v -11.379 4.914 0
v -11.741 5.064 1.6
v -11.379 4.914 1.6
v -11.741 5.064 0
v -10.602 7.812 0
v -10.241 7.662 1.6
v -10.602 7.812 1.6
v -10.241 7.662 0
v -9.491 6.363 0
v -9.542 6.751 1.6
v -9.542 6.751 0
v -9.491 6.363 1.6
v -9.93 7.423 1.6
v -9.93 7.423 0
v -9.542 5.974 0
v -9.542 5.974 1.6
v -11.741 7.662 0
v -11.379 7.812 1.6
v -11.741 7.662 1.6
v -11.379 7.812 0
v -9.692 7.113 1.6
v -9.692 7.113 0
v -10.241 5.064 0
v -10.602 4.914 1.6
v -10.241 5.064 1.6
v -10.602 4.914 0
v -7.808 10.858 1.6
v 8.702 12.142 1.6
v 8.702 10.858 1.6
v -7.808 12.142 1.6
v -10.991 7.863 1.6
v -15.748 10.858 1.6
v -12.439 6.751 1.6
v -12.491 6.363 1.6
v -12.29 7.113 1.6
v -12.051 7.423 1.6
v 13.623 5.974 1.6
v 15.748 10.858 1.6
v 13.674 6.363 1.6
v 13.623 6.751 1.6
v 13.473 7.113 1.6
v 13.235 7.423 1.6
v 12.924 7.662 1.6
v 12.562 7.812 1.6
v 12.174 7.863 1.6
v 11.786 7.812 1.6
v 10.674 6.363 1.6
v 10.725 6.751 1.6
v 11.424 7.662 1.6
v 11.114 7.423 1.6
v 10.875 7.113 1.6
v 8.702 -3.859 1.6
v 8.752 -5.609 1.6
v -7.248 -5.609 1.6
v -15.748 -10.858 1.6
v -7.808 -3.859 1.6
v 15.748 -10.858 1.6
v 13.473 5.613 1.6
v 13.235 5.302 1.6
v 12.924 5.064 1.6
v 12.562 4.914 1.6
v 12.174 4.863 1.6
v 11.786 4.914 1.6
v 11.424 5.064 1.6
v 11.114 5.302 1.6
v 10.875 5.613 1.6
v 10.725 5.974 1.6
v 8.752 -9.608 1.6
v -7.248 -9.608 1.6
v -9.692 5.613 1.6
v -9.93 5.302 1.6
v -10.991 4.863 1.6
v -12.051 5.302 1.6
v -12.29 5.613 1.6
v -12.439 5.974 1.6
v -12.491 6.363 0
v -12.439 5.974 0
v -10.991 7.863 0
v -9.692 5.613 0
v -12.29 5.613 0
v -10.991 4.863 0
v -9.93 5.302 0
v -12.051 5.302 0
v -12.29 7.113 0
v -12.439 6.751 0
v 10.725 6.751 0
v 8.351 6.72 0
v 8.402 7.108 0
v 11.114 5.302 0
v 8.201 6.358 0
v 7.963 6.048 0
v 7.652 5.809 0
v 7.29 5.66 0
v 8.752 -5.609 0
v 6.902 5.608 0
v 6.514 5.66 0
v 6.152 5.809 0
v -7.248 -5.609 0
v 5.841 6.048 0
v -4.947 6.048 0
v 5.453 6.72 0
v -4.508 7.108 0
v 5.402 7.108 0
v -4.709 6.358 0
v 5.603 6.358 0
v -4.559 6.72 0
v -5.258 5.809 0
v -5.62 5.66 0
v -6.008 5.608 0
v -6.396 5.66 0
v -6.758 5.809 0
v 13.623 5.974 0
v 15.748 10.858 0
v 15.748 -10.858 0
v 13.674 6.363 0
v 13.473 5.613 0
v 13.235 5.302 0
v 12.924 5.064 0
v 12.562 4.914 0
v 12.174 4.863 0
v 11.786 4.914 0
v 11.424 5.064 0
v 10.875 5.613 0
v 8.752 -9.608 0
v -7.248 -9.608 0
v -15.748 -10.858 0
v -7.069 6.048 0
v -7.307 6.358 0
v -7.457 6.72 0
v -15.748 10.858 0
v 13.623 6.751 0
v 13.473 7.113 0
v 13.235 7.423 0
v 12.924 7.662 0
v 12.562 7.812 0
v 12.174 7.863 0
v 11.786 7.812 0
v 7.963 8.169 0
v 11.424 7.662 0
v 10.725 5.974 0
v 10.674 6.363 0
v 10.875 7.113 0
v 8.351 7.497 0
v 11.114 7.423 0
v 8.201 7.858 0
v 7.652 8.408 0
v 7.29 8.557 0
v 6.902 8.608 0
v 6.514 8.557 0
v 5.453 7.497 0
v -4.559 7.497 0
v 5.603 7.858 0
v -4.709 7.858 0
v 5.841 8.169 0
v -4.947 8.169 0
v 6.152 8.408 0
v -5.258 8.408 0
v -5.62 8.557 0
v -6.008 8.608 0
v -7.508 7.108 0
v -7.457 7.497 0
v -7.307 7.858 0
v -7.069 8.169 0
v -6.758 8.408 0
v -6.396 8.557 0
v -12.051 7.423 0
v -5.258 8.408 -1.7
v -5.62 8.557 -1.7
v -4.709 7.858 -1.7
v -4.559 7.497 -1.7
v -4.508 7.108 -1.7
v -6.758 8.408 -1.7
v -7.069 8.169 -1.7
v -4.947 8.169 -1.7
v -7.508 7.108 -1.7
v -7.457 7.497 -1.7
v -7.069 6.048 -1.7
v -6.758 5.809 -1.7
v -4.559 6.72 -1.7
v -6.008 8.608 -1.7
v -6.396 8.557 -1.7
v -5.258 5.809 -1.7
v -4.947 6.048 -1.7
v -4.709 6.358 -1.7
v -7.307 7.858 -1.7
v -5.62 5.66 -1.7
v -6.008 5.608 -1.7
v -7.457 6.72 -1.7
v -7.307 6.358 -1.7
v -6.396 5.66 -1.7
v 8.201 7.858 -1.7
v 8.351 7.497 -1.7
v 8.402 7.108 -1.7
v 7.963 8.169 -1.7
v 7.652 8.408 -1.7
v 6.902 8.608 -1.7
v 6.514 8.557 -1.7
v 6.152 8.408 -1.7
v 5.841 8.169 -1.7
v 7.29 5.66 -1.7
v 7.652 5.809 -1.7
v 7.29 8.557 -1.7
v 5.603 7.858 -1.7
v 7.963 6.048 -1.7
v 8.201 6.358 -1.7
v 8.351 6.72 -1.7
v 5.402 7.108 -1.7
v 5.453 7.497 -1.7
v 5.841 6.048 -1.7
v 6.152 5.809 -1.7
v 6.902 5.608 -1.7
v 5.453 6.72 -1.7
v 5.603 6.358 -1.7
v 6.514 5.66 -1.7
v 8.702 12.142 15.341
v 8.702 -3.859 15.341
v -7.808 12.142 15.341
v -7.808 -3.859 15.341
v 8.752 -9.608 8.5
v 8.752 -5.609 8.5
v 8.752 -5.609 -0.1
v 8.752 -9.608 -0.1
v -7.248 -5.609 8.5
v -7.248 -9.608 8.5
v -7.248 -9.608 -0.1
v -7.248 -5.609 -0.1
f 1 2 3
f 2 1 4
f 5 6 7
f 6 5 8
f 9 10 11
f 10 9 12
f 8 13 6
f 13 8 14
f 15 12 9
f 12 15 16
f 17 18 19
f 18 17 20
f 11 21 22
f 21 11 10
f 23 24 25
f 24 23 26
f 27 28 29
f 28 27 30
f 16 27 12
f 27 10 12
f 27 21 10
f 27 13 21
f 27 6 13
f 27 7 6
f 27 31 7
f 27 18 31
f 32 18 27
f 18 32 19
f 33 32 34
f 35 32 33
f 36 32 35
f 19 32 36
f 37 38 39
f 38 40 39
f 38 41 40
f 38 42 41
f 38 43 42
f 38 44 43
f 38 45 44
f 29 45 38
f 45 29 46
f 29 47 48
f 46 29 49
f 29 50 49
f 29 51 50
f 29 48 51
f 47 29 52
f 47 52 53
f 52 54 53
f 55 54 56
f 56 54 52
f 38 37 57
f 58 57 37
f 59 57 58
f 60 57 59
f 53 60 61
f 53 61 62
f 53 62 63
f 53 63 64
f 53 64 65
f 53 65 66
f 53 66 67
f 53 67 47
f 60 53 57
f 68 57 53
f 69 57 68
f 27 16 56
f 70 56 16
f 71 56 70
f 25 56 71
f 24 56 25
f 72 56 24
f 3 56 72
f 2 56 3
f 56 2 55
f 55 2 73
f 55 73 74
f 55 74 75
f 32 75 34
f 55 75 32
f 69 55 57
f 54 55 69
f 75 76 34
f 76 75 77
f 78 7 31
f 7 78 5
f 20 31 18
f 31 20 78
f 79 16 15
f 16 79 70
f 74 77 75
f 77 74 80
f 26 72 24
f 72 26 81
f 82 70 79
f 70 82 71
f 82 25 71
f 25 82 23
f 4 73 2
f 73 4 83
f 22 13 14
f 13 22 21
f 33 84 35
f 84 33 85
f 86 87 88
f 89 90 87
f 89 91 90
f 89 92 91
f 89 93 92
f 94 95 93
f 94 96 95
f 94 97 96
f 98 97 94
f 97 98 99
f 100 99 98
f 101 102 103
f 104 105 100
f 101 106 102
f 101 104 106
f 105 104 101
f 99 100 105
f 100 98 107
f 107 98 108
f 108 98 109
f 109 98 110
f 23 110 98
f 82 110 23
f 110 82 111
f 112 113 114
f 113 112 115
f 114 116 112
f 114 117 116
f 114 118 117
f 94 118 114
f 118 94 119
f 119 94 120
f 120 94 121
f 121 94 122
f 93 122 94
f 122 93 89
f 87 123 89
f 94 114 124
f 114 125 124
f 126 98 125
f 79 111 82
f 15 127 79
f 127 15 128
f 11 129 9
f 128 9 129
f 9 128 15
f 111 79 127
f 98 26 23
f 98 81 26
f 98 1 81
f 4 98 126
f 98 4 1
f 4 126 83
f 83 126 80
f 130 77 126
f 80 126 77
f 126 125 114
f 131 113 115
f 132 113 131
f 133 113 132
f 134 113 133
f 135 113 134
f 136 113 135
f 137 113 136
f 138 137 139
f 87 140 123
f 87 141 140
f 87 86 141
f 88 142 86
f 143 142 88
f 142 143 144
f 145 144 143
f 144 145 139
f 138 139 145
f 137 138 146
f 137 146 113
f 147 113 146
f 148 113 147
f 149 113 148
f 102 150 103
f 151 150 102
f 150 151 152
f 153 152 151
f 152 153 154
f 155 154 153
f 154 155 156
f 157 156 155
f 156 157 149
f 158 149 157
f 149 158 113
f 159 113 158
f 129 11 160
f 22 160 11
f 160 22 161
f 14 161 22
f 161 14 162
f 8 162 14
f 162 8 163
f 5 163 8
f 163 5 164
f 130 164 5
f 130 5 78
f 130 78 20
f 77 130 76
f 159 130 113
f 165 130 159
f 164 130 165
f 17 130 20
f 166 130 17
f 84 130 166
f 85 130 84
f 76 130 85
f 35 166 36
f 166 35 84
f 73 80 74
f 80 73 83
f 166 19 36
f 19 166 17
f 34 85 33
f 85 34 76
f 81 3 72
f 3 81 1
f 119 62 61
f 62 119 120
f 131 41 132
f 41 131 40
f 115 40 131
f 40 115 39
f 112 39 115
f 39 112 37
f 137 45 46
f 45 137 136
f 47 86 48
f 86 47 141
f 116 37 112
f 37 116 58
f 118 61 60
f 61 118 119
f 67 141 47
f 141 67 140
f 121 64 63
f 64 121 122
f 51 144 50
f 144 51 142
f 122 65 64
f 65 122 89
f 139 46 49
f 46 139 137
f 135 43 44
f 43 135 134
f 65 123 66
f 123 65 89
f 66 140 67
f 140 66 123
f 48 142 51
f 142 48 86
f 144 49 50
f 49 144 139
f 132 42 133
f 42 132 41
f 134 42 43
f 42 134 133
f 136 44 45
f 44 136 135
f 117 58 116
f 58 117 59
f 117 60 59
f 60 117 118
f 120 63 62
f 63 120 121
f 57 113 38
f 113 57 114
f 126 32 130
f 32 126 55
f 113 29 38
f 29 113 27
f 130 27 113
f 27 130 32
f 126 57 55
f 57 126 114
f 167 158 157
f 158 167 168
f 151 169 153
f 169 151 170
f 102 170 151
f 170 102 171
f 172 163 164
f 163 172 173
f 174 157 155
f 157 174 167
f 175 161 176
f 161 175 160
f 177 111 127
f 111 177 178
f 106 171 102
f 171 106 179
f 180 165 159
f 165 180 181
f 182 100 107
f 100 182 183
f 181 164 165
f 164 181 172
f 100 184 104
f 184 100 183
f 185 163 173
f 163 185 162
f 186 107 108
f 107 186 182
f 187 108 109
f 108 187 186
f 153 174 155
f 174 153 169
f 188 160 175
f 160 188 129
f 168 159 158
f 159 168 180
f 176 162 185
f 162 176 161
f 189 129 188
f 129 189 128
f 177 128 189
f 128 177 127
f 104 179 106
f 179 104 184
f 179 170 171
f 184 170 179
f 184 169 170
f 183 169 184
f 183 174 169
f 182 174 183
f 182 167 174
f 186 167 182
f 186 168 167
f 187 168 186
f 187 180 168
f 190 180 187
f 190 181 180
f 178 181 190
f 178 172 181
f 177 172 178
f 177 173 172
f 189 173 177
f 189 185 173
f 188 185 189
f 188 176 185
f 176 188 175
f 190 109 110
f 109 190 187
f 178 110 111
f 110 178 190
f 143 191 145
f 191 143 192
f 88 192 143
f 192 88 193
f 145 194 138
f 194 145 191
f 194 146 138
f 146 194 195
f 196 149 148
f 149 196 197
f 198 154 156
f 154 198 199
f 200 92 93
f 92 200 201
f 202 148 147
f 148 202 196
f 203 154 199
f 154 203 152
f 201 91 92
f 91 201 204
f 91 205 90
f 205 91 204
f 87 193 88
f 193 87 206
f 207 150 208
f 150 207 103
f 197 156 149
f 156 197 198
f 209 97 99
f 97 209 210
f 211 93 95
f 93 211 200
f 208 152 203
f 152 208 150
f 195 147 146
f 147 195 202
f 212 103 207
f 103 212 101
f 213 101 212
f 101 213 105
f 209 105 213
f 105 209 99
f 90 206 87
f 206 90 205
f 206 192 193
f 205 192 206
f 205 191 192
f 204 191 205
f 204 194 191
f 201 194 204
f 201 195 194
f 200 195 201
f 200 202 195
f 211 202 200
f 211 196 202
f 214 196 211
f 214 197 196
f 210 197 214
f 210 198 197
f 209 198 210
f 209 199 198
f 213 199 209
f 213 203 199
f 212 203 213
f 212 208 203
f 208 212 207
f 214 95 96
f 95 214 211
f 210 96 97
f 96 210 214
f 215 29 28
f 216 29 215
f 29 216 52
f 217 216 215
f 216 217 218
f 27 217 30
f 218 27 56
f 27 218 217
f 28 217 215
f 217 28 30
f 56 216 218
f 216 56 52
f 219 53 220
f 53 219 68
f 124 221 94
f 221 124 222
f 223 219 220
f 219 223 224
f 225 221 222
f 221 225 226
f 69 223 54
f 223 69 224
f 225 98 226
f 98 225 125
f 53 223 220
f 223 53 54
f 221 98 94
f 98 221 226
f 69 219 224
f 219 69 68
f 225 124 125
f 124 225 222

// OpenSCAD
// file: smidge.scad
//
// Copyright (c) Stewart H. Whitman, 2020-2021.
//
// File:    smidge.scad
// Project: General
// License: CC BY-NC-SA 4.0 (Attribution-NonCommercial-ShareAlike)
// Desc:    SMIDGE constant used in preview mode.
//

// Smidge constant for rendering only (to avoid Z-axis fighting, etc.)
SMIDGE = $preview ? 0.01 : 0;
// main file
//
// Copyright (c) Stewart H. Whitman, 2020-2021.
//
// File:    commell-nic.scad
// Project: Dell Wyse 5070 2nd Ethernet Adapter Adapter
// License: CC BY-NC-SA 4.0 (Attribution-NonCommercial-ShareAlike)
// Desc:    Mock-up of the common Commell M2-210 M.2 Ethernet Daughter Board
//

include <smidge.scad>;

// Commell M2-210 M.2 A/E-type Ethernet:
// Ref: http://www.commell.com.tw/Product/Peripheral/M.2%20(NGFF)%20card/M2-210.htm
//
// Most values come from manual (direct or calculated). Missing
// values (e.g. width of board after splitting at perforation), were
// measured and are noted as such.
//
// A few measurements were corrected for better fit (or perhaps
// documentation errors) and are noted.
//

function inches_to_mm(n) = 25.4*n;

// kind:
//
// Unique, for customization.
//
function nic_kind() = "commell";

// PCB size [width,depth,thickness]
//
// Measured thickness is ~1.57mm (nominal 4-layer PCB thickness). This board
// seems a little thicker. Width is measured to perforation.
//
// The manual says 0.8331 inches depth, but it measures around 0.855, so I
// have changed that.
//
function nic_get_pcb_size() = [ inches_to_mm(1.24), inches_to_mm(0.855), 1.60 ];

// bottom hole positions [from left=0, rear=0]
function _nic_get_left_hole() = [ inches_to_mm(0.1873), nic_get_pcb_size().y - inches_to_mm(0.1770)];
function _nic_get_right_hole() = [ inches_to_mm(1.0993), nic_get_pcb_size().y - inches_to_mm(0.1770)];
function nic_get_bottom_holes() = [ _nic_get_left_hole(), _nic_get_right_hole() ];
// bottom hole diameter (M3x0.5)
function nic_get_bottom_hole_diameter() = 3.0;

// ethernet size [left<->right,front<->rear,top<->bottom]
//
// N.B.: Manual says the ethernet port measures: 0.5185" (13.2mm) x 0.6614" (16.8mm), but
//       mine measured at 0.541" (13.8mm) x 0.650" (16.5mm).
//
// Depth as measured.
//
function nic_get_ethernet_size() = [ inches_to_mm(0.650), 16.00, inches_to_mm(0.541) ];

// bracket hole sizes specified: 17.5mm W x 13.9mm V
// ethernet size in mm: 16.5mm x 13.8mm
//  implies spacing of ~0.35 around sides of the port cut out
//

// ethernet position measures 8.25mm from left side
function _nic_get_ethernet_left_pos() = inches_to_mm(0.3126) ;
function _nic_get_ethernet_right_pos() = _nic_get_ethernet_left_pos()+nic_get_ethernet_size().x;
function _nic_get_ethernet_bottom_pos() = nic_get_pcb_size().z;
function nic_get_ethernet_center_pos() = [ (_nic_get_ethernet_left_pos()+_nic_get_ethernet_right_pos())/2, _nic_get_ethernet_bottom_pos() + nic_get_ethernet_size().z/2 ];
function nic_get_ethernet_projection() = 7.25 + nic_get_ethernet_size().y - nic_get_pcb_size().y; // Measured Overhang ~2mm

// shield (none)
function nic_get_shield_thickness() = 0;
function nic_get_shield_size() = [];
function nic_get_shield_hole_diameter() = 0;
function nic_get_shield_holes() = [];
function nic_get_shield_center_pos() = [ 0, 0 ];

// Layout of the nic board (PCB centered with NIC port hanging out)
module nic(transparency=1.0,center=true,with_shield=true) {

  module hole() {
    translate( [0,0,-SMIDGE] ) cylinder( h = nic_get_pcb_size().z+2*SMIDGE, d=nic_get_bottom_hole_diameter() );
  } // end hole

  // PCB with notch and hole
  module pcb() {
    color( "green", transparency )
      difference() {
	// board
	cube( nic_get_pcb_size() );
        // holes
        for( h = nic_get_bottom_holes() )
	  translate( concat( h, 0 ) ) hole();
      }
  } // end pcb

  module ethernet() {
    color( "silver", transparency )
      translate( [_nic_get_ethernet_left_pos(),7.0,nic_get_pcb_size().z] ) cube( nic_get_ethernet_size() );
    color( "black", transparency ) {
      h = 3.30;
      translate( [_nic_get_ethernet_left_pos()+1.8,nic_get_pcb_size().y-3.75,nic_get_pcb_size().z-h] ) cylinder( h=h, d=3.00 );
      translate( [_nic_get_ethernet_right_pos()-1.8,nic_get_pcb_size().y-3.75,nic_get_pcb_size().z-h] ) cylinder( h=h, d=3.00 );
    }
  } // end ethernet

  module header() {
    color( "black", transparency )
      translate( [ 8.5, 1.25, -0.1 ] ) cube( [ 16, 4, 7+nic_get_pcb_size().z] );
  } // end header

  // entire nic
  translate( center ? -[nic_get_pcb_size().x,nic_get_pcb_size().y,0]/2 : [0,0,0] ) {
    pcb();
    ethernet();
    header();
  }
} // end nic

nic($fn=24);
